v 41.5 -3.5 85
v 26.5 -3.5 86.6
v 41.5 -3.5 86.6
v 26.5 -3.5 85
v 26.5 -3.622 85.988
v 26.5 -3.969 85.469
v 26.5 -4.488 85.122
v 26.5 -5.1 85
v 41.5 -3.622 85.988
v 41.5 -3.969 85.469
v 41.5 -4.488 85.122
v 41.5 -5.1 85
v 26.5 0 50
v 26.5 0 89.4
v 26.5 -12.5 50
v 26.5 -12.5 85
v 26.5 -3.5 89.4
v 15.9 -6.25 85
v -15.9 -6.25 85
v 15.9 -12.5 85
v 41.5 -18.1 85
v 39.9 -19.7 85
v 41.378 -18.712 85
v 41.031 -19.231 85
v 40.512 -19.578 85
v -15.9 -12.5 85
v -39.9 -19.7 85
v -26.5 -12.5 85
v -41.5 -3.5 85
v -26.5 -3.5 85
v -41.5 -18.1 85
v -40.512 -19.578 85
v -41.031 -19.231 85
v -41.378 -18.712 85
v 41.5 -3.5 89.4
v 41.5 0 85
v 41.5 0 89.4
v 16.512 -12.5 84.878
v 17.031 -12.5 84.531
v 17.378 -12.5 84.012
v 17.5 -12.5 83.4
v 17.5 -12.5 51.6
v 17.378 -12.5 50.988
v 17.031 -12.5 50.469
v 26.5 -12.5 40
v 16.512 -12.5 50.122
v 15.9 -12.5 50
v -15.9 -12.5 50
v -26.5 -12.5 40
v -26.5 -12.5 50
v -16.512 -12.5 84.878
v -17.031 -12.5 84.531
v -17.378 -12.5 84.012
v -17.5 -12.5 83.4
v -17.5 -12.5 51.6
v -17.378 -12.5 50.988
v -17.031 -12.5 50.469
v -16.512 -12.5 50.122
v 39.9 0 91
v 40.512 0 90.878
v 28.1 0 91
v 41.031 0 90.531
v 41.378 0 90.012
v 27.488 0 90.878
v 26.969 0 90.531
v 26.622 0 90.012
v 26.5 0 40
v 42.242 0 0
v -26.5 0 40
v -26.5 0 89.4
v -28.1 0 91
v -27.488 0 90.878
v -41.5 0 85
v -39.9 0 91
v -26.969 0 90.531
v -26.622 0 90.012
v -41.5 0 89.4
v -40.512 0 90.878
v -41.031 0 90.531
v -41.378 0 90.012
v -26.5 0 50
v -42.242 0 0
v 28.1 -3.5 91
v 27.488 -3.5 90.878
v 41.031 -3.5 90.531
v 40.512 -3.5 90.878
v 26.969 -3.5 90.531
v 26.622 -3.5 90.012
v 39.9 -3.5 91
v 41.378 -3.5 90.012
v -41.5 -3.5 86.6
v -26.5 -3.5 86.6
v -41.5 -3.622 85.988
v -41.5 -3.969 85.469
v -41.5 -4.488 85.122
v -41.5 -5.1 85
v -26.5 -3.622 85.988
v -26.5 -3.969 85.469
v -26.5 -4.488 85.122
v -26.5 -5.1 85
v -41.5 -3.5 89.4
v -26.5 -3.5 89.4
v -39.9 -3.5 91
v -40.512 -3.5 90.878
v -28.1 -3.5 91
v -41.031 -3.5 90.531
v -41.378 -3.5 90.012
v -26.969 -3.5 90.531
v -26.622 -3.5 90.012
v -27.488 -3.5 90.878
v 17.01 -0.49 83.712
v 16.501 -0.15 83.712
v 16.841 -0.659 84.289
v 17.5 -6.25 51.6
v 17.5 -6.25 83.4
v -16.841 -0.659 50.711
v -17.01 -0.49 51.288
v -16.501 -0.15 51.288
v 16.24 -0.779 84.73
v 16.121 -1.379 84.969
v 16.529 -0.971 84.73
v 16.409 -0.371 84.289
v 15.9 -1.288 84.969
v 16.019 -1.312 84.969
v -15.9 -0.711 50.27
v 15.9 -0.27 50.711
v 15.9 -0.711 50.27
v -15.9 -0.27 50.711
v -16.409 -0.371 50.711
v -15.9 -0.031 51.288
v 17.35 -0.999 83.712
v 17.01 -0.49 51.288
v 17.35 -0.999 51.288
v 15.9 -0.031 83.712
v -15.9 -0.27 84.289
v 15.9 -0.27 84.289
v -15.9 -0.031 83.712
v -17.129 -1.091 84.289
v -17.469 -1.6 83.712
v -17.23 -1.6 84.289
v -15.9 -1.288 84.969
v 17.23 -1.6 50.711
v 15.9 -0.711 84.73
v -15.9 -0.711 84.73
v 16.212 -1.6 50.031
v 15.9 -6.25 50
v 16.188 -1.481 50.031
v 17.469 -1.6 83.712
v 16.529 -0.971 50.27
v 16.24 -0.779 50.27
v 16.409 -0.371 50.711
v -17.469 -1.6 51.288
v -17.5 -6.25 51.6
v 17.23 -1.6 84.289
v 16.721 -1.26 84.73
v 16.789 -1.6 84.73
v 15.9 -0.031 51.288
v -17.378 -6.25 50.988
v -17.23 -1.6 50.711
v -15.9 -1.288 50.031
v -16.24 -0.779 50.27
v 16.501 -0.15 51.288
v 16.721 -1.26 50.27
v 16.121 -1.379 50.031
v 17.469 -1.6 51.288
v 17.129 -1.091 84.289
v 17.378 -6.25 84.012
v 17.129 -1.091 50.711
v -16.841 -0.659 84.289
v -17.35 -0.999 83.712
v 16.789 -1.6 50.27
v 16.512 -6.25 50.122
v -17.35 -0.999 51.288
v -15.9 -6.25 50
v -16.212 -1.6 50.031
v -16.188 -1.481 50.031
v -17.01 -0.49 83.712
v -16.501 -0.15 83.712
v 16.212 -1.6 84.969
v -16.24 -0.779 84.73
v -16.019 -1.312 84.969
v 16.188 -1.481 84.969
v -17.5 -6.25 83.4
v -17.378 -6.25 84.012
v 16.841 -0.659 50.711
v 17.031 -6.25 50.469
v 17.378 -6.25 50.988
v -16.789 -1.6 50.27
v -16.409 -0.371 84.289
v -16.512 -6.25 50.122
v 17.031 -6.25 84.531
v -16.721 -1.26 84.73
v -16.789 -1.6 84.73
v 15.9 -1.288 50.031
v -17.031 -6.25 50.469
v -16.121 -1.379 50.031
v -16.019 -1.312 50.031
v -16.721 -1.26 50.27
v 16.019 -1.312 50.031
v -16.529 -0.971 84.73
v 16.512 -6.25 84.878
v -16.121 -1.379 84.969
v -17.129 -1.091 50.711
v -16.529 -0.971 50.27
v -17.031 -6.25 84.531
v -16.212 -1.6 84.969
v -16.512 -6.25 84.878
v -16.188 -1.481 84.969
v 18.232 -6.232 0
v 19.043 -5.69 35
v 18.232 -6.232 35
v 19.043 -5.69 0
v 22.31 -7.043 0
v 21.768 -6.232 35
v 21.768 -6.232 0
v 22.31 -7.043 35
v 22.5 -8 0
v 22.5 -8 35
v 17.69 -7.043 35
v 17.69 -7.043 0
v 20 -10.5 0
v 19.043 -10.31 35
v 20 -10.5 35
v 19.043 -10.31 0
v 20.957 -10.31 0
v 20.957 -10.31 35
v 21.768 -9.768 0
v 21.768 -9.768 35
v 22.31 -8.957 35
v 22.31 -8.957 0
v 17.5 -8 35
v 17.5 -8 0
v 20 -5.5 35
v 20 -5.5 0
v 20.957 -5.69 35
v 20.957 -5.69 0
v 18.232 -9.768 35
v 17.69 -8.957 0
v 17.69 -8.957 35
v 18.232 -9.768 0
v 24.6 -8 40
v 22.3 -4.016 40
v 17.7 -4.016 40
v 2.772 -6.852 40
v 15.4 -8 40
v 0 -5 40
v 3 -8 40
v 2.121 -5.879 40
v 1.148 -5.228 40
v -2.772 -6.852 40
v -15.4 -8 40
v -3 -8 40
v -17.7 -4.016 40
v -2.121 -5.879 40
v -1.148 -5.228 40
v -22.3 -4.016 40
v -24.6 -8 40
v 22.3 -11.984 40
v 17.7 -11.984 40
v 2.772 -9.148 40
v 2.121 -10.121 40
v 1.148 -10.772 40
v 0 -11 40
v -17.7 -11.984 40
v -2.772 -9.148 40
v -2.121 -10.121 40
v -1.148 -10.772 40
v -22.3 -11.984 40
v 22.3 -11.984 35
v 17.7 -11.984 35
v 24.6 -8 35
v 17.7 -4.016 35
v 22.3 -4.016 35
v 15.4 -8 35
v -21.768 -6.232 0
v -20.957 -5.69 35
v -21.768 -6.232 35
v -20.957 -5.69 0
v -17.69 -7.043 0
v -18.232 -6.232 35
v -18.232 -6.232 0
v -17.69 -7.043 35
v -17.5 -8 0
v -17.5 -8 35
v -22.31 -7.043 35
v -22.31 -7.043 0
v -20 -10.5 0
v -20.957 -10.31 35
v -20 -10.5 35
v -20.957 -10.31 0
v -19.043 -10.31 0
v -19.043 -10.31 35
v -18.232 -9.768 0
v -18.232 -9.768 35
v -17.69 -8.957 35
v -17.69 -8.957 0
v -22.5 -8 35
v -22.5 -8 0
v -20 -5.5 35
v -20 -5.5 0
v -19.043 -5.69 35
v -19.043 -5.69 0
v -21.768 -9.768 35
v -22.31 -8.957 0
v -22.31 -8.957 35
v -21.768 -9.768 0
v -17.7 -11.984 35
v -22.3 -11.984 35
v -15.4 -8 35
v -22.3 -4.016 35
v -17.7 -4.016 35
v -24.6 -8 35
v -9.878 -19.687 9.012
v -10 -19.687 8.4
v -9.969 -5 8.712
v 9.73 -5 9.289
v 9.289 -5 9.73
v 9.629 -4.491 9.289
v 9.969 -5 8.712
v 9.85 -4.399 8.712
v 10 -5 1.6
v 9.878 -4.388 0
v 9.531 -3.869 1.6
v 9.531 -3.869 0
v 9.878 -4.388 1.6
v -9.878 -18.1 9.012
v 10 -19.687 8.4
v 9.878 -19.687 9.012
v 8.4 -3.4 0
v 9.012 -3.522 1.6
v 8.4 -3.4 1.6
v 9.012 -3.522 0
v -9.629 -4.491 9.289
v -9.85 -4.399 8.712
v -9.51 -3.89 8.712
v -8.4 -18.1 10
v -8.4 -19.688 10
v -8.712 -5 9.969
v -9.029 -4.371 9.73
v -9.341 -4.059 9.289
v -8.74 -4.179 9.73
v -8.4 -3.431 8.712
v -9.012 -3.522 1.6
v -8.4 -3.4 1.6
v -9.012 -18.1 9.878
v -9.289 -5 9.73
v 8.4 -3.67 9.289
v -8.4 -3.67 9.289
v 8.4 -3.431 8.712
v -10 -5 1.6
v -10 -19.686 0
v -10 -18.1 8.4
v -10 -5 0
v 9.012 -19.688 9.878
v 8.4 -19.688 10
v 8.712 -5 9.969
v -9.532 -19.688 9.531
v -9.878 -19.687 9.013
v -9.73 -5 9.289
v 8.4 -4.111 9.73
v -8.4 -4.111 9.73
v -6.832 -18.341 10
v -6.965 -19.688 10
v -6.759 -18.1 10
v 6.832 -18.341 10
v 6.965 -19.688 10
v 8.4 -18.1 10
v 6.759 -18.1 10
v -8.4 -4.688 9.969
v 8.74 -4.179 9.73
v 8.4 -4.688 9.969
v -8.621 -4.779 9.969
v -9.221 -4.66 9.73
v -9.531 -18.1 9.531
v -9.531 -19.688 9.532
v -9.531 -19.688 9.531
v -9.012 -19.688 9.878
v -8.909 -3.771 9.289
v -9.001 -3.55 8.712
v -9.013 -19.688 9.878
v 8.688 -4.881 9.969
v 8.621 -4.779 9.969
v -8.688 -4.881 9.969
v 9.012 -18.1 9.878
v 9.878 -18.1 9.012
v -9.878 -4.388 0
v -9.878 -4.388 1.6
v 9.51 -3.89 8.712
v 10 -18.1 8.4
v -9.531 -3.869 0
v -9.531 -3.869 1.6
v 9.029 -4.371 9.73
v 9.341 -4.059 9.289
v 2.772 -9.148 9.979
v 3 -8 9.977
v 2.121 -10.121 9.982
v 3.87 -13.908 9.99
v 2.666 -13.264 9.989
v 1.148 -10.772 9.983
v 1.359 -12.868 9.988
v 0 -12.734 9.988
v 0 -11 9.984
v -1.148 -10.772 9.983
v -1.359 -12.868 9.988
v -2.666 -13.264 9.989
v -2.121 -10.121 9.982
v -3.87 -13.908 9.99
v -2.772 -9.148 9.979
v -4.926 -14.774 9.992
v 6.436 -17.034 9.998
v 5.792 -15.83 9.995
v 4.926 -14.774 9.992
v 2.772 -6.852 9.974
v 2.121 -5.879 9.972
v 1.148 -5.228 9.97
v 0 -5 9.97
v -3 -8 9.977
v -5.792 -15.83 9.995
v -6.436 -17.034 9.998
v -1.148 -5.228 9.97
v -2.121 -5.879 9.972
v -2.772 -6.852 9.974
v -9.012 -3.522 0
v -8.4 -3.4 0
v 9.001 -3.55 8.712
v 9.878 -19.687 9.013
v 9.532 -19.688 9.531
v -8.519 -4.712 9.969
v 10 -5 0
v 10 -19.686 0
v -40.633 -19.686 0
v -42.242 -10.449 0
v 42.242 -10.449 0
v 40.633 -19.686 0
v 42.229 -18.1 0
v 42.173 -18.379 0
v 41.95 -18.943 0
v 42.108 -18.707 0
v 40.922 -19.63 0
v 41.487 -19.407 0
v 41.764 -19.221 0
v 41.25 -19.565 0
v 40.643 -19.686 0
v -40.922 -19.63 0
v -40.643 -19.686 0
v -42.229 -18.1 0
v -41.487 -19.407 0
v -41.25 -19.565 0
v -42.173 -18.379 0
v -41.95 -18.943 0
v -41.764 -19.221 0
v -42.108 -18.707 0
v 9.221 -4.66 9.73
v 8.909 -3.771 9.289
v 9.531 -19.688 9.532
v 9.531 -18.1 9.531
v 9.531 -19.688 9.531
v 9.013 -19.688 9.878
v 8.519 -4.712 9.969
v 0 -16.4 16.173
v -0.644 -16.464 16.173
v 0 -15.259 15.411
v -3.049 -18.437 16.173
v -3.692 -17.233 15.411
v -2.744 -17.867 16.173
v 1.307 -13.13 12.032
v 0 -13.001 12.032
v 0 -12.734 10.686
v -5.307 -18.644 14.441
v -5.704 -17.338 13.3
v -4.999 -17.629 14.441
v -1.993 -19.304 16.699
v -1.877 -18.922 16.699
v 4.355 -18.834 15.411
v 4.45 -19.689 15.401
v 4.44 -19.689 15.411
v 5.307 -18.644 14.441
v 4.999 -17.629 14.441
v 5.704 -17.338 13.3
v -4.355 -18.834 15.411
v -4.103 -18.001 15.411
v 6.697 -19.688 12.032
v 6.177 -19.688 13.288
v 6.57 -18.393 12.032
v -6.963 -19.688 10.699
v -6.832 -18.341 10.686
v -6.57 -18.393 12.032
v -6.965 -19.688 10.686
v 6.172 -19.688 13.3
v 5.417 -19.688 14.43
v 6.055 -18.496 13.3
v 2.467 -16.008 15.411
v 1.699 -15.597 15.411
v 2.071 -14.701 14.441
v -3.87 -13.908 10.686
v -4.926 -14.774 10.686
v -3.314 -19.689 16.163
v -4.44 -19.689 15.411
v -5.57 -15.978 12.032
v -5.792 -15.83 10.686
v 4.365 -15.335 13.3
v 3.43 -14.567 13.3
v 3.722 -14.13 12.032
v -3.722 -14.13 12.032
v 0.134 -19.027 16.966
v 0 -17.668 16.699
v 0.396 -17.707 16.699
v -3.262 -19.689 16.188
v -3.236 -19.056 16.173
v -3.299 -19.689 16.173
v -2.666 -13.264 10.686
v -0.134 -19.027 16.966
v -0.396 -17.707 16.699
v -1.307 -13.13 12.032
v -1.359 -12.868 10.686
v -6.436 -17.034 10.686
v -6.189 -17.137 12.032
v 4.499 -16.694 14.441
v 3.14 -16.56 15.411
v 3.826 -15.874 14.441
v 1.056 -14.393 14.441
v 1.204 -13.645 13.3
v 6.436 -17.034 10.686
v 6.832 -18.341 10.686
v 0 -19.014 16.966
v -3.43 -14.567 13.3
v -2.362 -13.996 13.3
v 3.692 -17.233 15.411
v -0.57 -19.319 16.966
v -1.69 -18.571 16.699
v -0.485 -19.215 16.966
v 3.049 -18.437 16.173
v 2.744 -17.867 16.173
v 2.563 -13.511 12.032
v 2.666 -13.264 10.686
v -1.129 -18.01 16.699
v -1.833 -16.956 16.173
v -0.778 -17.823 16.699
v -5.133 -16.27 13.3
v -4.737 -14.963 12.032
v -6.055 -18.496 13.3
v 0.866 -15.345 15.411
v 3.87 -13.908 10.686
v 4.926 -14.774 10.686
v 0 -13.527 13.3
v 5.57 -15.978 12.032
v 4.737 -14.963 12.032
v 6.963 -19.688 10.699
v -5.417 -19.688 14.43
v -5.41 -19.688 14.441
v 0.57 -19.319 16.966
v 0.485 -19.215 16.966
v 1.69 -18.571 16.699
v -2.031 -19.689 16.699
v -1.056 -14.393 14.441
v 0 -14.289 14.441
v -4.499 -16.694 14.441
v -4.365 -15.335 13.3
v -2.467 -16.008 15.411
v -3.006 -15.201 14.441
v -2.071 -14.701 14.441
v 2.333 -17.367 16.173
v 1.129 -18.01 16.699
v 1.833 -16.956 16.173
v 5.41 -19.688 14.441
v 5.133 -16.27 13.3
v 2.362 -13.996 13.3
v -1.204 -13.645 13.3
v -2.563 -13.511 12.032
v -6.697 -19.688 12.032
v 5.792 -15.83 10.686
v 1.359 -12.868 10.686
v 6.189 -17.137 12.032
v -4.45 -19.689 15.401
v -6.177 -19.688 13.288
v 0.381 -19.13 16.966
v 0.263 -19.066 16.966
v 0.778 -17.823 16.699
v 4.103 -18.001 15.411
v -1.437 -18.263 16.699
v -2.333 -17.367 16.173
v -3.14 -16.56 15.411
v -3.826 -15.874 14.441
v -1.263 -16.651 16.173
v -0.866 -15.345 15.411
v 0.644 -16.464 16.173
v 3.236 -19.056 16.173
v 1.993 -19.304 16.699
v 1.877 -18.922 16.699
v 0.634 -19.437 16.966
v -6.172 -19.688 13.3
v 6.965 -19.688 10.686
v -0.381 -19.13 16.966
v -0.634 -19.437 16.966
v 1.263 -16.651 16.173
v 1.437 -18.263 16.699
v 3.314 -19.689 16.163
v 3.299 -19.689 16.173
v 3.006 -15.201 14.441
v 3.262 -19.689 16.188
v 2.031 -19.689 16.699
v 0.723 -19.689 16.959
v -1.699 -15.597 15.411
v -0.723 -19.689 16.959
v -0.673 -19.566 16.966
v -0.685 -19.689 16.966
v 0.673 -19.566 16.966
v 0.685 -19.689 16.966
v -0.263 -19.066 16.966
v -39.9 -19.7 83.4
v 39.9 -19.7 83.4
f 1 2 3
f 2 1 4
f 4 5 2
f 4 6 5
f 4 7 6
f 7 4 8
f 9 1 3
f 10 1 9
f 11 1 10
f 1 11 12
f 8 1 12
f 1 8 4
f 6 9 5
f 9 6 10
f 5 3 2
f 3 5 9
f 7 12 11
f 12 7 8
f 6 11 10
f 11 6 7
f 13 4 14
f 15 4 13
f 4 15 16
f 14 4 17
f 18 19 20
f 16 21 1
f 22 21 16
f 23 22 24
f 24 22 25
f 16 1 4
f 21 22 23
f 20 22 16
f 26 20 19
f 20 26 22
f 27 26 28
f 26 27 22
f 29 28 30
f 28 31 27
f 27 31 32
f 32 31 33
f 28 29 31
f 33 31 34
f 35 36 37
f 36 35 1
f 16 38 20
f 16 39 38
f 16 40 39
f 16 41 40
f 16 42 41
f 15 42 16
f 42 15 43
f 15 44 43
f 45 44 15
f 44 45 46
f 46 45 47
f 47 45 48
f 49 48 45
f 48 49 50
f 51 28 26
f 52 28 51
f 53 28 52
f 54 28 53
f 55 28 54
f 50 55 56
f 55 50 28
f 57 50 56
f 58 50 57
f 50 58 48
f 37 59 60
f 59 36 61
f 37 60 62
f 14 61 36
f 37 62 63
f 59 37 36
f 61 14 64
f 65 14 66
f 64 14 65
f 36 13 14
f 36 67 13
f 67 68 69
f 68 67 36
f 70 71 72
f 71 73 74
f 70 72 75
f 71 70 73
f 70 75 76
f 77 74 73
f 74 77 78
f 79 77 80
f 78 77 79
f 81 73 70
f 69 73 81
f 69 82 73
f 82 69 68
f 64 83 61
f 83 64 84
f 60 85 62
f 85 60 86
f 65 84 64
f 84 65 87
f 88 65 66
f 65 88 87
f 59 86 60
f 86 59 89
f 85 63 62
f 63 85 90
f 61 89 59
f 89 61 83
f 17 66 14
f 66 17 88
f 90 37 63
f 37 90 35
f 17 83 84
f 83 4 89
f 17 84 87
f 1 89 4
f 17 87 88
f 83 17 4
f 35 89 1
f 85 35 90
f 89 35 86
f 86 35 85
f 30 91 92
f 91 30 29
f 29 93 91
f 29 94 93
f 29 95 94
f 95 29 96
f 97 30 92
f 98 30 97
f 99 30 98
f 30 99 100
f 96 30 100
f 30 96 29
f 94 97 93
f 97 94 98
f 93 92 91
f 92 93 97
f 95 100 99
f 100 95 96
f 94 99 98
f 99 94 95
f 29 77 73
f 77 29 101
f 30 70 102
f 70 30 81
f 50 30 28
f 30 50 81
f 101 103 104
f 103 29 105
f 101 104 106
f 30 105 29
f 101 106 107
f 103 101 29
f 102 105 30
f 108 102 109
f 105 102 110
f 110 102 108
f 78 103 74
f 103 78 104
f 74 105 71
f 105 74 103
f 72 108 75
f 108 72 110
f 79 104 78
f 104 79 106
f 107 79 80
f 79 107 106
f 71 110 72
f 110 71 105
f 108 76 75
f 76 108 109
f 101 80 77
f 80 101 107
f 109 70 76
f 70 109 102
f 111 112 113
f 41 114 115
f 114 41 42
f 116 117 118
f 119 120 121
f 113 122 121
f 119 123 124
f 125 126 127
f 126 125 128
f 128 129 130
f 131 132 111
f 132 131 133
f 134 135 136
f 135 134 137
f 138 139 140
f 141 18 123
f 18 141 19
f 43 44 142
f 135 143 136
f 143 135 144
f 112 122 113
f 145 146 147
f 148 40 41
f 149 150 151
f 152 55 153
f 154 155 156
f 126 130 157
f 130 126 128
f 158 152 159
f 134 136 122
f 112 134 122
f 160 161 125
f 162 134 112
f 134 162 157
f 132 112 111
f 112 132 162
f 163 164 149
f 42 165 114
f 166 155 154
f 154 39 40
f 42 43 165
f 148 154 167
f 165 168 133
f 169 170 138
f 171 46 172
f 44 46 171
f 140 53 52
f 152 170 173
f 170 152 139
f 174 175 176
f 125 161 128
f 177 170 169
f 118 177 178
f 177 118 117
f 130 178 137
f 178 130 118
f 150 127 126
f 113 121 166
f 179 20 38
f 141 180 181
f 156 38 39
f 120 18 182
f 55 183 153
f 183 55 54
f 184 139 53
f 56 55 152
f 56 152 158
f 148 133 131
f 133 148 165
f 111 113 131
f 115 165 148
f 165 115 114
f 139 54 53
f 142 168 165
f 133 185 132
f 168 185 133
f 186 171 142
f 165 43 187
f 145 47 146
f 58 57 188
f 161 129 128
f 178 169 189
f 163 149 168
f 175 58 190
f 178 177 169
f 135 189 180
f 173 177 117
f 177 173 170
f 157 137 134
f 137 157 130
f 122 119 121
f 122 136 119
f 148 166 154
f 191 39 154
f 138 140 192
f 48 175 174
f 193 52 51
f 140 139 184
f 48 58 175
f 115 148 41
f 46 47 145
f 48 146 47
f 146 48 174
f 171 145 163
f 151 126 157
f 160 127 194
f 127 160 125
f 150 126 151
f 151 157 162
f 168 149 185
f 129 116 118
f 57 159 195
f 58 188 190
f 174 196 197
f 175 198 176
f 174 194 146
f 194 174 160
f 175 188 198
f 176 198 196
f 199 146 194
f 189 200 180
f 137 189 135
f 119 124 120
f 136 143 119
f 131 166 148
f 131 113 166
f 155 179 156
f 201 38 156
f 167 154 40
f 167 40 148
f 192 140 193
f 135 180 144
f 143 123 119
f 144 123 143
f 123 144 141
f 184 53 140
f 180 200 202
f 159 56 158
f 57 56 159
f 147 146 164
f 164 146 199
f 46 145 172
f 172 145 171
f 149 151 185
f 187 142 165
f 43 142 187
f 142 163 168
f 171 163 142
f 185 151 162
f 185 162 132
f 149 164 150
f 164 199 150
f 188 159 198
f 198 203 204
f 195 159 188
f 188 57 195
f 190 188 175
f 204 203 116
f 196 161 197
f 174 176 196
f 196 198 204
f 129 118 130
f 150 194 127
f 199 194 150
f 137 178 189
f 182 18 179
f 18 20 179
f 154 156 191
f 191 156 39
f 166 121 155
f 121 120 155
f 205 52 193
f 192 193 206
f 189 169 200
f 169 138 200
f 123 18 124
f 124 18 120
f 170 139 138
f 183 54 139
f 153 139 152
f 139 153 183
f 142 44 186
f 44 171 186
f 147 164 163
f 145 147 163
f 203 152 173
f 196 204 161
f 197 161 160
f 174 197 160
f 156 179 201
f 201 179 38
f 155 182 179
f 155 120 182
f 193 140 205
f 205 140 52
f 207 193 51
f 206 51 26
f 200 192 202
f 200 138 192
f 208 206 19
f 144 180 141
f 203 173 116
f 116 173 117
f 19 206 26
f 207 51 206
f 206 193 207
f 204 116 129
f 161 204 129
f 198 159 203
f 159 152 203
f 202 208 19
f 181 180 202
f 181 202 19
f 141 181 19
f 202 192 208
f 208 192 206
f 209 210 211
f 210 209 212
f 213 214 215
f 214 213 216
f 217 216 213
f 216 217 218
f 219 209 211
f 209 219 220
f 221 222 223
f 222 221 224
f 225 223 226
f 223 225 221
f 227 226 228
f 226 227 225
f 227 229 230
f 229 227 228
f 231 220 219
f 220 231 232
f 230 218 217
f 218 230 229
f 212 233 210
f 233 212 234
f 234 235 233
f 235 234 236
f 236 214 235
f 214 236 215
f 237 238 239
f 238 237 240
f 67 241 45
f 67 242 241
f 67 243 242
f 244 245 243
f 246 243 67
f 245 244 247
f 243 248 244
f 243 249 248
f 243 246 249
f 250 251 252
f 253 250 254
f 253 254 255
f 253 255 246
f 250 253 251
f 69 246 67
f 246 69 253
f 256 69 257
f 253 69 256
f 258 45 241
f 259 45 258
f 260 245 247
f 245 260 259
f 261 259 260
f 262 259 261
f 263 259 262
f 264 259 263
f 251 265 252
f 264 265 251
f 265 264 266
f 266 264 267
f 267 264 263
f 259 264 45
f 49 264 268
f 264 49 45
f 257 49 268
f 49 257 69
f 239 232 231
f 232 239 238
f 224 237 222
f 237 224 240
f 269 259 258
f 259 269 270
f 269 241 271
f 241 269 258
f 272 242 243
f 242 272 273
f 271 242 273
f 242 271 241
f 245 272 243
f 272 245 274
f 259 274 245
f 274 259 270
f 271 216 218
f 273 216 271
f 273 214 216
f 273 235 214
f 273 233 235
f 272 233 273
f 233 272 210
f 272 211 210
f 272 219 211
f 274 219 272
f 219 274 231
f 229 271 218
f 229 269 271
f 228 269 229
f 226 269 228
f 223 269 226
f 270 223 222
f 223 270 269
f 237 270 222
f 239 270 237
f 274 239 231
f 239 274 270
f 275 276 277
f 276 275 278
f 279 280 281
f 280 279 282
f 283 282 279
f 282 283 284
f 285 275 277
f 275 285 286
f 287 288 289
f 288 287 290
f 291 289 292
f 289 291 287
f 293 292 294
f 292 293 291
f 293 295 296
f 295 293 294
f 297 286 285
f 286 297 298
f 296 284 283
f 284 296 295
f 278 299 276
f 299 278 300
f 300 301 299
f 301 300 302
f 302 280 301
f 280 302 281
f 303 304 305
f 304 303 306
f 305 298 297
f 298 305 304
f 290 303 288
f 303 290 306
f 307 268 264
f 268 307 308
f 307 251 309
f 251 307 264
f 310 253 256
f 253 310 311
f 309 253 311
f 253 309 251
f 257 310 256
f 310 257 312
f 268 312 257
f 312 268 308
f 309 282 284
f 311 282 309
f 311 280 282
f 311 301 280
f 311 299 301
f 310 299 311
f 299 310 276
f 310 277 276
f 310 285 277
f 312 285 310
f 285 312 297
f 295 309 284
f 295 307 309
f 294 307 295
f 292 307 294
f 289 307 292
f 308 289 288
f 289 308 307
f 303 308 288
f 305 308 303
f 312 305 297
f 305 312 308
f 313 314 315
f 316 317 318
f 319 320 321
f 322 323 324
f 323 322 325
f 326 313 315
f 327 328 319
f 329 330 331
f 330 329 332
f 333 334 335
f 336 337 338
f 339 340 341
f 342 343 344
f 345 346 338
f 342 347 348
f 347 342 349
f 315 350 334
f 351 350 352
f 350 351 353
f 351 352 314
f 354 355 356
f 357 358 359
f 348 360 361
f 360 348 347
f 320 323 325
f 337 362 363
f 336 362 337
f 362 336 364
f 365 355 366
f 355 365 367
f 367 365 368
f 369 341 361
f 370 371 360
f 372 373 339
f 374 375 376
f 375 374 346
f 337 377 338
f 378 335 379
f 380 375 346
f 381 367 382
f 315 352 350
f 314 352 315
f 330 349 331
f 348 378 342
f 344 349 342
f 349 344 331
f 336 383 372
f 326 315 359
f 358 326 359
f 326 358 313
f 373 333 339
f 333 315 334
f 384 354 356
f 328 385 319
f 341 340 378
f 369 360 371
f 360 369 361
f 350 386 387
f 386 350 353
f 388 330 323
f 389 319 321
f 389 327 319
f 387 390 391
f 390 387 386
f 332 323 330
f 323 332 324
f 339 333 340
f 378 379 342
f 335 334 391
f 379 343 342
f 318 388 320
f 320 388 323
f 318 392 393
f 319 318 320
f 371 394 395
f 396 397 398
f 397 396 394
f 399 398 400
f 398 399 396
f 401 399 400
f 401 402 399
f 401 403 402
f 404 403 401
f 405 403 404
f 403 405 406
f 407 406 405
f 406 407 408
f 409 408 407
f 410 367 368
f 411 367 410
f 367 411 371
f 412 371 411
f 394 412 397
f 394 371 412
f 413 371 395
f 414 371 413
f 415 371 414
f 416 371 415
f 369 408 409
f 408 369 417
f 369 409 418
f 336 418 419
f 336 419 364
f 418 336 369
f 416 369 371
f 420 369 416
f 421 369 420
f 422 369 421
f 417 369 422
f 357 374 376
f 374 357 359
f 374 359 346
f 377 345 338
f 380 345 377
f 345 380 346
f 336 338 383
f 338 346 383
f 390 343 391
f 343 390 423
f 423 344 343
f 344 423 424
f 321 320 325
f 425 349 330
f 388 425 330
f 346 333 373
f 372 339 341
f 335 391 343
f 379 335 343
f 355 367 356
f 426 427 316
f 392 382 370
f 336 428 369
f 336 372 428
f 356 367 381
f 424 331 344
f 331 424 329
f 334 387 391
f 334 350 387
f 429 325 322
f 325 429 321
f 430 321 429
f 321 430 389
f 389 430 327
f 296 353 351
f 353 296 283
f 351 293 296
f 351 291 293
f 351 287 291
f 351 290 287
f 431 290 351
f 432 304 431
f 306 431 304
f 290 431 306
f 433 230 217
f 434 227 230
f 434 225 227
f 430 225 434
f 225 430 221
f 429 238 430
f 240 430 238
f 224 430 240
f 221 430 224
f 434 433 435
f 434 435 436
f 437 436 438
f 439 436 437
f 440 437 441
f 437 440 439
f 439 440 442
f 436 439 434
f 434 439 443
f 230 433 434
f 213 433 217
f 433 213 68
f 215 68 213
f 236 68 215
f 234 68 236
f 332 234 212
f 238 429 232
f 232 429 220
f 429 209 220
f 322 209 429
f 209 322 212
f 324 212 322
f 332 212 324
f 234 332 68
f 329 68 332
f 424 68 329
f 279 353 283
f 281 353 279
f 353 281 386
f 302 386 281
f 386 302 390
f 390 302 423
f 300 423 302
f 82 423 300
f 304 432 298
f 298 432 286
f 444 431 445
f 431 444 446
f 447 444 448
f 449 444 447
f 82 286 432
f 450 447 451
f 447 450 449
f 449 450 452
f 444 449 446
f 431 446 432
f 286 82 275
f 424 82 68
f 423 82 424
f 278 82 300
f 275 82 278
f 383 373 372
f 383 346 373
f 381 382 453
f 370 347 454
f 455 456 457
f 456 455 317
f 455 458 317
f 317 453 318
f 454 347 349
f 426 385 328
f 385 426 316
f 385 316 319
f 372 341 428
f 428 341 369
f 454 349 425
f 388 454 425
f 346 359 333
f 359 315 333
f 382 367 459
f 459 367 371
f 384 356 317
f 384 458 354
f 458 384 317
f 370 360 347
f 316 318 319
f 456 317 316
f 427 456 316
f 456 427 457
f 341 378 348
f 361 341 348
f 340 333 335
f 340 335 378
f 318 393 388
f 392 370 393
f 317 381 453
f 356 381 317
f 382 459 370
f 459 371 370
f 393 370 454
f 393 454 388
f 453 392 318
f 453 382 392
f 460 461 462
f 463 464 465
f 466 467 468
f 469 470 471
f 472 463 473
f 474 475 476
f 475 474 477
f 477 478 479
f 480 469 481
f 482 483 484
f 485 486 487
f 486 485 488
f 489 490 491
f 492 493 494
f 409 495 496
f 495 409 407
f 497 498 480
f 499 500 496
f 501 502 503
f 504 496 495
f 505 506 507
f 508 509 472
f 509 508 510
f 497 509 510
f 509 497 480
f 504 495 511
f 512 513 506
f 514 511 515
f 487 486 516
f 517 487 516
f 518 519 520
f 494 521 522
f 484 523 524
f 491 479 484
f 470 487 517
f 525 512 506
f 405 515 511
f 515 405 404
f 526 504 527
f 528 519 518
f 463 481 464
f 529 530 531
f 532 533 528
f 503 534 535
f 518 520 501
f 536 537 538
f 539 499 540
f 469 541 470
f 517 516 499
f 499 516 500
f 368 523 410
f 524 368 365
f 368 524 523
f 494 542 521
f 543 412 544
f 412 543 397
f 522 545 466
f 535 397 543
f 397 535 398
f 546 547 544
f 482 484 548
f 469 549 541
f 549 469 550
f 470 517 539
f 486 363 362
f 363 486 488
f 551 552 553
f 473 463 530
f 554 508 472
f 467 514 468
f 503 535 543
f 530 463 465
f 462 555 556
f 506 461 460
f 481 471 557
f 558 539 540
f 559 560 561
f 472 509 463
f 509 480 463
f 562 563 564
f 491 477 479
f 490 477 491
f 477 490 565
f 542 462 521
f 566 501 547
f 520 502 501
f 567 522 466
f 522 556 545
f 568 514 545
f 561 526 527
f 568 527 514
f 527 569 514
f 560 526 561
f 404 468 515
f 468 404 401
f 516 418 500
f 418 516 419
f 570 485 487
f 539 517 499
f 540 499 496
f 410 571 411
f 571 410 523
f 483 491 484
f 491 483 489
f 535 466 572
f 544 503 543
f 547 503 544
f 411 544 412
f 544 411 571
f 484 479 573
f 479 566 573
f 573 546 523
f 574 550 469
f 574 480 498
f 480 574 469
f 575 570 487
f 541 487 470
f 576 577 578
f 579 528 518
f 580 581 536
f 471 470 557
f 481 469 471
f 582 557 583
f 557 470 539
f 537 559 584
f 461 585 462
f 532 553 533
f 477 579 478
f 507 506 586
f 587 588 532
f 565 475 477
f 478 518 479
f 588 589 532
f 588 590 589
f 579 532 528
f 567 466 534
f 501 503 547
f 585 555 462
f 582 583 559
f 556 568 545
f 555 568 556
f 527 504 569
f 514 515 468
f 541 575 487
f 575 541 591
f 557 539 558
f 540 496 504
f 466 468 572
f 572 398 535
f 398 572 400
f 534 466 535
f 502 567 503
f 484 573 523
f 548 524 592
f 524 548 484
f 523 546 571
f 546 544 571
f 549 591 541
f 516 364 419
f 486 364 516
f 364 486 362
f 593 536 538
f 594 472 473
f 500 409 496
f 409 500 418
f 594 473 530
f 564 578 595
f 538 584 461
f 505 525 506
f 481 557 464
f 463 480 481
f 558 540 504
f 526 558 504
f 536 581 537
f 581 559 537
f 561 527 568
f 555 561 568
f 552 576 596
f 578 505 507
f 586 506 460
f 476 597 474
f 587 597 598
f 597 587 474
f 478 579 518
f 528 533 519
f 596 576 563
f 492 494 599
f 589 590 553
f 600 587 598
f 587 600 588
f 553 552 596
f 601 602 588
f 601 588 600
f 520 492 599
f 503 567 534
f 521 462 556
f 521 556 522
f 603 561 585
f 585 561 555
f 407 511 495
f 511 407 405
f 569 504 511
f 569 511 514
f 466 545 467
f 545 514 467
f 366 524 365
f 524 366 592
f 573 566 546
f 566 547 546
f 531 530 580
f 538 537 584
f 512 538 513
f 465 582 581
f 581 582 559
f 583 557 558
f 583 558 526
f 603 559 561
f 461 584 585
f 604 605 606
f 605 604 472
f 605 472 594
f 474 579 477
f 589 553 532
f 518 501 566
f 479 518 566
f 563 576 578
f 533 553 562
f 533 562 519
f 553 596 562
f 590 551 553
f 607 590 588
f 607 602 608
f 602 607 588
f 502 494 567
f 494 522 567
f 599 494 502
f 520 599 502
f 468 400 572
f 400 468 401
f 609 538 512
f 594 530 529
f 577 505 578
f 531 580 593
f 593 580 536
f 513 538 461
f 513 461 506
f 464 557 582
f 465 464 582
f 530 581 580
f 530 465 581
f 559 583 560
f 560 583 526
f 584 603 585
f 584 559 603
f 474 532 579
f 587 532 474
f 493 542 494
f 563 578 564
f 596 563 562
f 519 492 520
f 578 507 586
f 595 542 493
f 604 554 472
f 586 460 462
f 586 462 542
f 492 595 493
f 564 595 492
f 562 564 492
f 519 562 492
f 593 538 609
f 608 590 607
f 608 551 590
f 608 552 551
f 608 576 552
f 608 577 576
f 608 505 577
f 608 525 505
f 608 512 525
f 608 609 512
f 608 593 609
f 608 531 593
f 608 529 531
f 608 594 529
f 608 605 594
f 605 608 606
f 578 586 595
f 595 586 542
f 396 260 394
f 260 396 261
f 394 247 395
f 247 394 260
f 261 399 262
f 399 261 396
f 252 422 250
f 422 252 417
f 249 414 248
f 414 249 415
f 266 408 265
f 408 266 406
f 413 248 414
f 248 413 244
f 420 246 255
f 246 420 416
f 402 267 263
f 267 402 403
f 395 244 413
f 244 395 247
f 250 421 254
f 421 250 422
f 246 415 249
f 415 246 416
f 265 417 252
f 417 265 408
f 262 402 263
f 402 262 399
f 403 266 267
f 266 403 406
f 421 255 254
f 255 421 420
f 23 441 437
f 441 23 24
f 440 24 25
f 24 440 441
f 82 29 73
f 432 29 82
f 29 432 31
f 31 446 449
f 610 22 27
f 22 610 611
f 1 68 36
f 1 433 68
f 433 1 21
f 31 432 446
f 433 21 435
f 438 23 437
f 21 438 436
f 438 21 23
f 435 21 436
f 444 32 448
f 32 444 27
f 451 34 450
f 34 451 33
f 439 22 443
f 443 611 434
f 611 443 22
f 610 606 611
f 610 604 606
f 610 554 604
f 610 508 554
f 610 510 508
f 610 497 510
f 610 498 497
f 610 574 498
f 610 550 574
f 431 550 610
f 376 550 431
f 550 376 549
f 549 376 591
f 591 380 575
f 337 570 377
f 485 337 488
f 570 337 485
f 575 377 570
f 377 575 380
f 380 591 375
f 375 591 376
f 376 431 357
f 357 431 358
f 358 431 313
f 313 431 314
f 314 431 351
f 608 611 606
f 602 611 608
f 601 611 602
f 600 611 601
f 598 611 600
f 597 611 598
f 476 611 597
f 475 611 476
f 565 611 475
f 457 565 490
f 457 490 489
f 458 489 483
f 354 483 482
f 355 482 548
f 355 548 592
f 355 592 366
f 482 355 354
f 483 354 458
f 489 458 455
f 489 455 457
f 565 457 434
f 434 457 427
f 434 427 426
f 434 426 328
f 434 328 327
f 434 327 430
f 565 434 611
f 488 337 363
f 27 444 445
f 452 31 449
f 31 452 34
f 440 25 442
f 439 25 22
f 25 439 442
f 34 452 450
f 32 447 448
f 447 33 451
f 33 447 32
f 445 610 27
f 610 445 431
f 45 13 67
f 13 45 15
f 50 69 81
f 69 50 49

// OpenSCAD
// file: brompton-klickfix.scad
use <MCAD/regular_shapes.scad>

//Bodge amount for overlapping parts in difference operations
b = 0.1;

//Klickfix lift
kl = 150;


//Main body dimensions
w = 83;
d = 19.7;
h = kl+35;

//Split height
spl = 100;

//Brompton socket height
bsh = 70;
	
//Stiffeners
sd = 5;

//Corner radius
r = 1.6;

module fillet (r,l) {
	rotate([0,0,180])
		translate([-r,-r,0])
			difference() {
				cube([r,r,l]);
				translate([0,0,-l/2])
					cylinder(2*l,r,r,$fn=16);
    }
}

module spool(sd,sl) {
	t = 0.1;
	cylinder(sl,sd/2,sd/2,$fn=16);
	cylinder(sd,sd*1.8/2+t,sd*1.8/2+t,$fn=16);
	translate([0,0,sl-sd])
		cylinder(sd,sd*1.8/2+t,sd*1.8/2+t,$fn=6);
}

//Cube with 8 rounded edges and 4 square edges
module semi_rounded_cube(w,d,h,r) {
    hull()
        for(i=[0,1])
            for(j=[0,1])
                translate([r+i*(w-2*r),r+j*(d-2*r),0]){
                    cylinder(r,r,r,$fn=16);
                    translate([0,0,h-r])
                        sphere(r,$fn=16);
                }
}

//Cube with 5 rounded edges and 7 square edges
module demi_rounded_cube(w,d,h,r) {
    hull()
        for(i=[0,1])
            translate([r+i*(w-2*r),0,0]){
                translate([0,r,0])
                    cylinder(r,r,r,$fn=16);
                translate([-r,d-2*r,0])
                    cube([2*r,2*r,2*r]);
                translate([0,r,h-r])
                    sphere(r,$fn=16);
                translate([0,d-r,h-r])
                    rotate([-90,0,0])
                        cylinder(r,r,r,$fn=16);
            }

}


//Extruded trapezium with rounded sides
//h=height
//w=width of base between centres of rounded sides
//a=angle of sides from vertical
//r=radius of rounded sides (thickness = 2*r)
module rd_tpz(h,w,a,r) {
    union() {
        intersection() {
			//Create two cylinders for the rounded sides
            union() {
                translate([-w/2,0,0])
                    rotate([0,a,0])
                        translate([0,0,-h/2])
                            cylinder(2*h,r,r);               
                translate([w/2,0,0])
                    rotate([0,-a,0])
                        translate([0,0,-h/2])
                            cylinder(2*h,r,r);
            }
			//Intersect with cube to get desired height
            {
                translate([0,0,h/2])
                    cube([2*w,r*4,h],true);
            }
       }

	//Fill in between cylinders with an extruded trapezium
    w_t=w-2*h*tan(a);
    translate([0,r,0])
        rotate([90,0,0])
            linear_extrude(height=2*r,convexity=10)
                polygon([[-w/2,0],[-w_t/2,h],[w_t/2,h],[w/2,0]]);
    }
}

//Round fillet for front of brompton socket
//r = radius of fillet
//a = tilt angle
//h = height of fillet
module b_fill (r,a,h) {
    intersection(){
        rotate([0,a,0]){
			//Create fillet by subtracting two cylinders from a cube
            difference(){
                translate([-r,0,-h/2])
                   cube([2*r,r,2*h]);
                translate([-r,0,-h/2])
                    cylinder(2*h,r,r);
                translate([r,0,-h/2])
                    cylinder(2*h,r-b,r-b);
            }
        }
		//Intersect with cube to get desired height
		translate([0,0,h/2])
			cube([2*h,r*4,h],true);
    }
}

//Brompton socket
module b_socket () {
	//Parameters
	r = 13.7/2;	//Radius of groove
	h = bsh;		//Height of socket
	c = 2.45;		//Clearance around mounting block
	w = 67.5+2*c-2*r;	//Width of socket between groove centres
	a = 7.4;		//Tilt angle of grooves from vertical
	t = 3;		//Thickness of socket shell
	s = 1;		//Size of step in groove
	sp = 2/3;	//Position of step relative to socket height
	ow = 34;		//Width of cut-out in back of socket
	tc = [15,t+b,20];	//Size of latch hole
	th = 27;		//Height of latch hole centre
	translate([0,-r-t,0])
		difference() {
			//External shape of socket
			rd_tpz(h,w,a,r+t);
			//Remove Lower part of inner
			translate([0,0,-b])
				rd_tpz(h*sp+b*2,w+b*sin(a),a,r);
			//Remove Upper part of inner
			translate([0,0,h*sp])
				rd_tpz(h*(1-sp)+b,w-2*h*sp*tan(a)-2*s ,a,r);
			//Remove Rear cut-out
			translate([0,-r+b/2,0])
				rotate([90,0,0])
					linear_extrude(height=t+b,convexity=10)
						polygon([[-w/2,-b],[-ow/2,(w-ow)/2],[-ow/2,h+b],[ow/2,h+b],[ow/2,(w-ow)/2],[w/2,-b]]);
			//Remove Latch hole
			translate([0,r+t/2,th])
				cube(tc,center=true);
		}

	//Add fillets at front of socket
	/*translate([-w/2-r-t,-r-t,0])
		b_fill(r+t,a,h);
	mirror([1,0,0])
		translate([-w/2-r-t,-r-t,0])
			b_fill(r+t,a,h);*/
}

module kfix_plug () {
	//Parameters
	h = 35;		//Height of plug
	d = 12.5;	//Depth of plug
	sw = 35;	//Width of square
	sr = 1.6;	//Radius of square corners
	hc = 68;	//Hook spacing
	hw = 15;	//Hook width
	hl = 6;		//Hook length
	ht = 3.5;	//Hook thickness
	
	//Square plug
	hull()
		for(i=[0,1])
			for(j=[0,1]) {
				translate([-sw/2+sr+i*(sw-2*sr),sr,sr+j*(h-2*sr)])
					sphere(sr,$fn=16);
				translate([-sw/2+sr+i*(sw-2*sr),d,sr+j*(h-2*sr)])
					rotate([90,0,0])
						cylinder(d/2,sr,sr,$fn=16);
			}
	//Hooks
	for(i=[0,1]) {
		c = -hc/2+i*hc; //Centre of this hook
		translate([c-hw/2,0,0]){
			cube([hw,d,h]);
			translate([0,0,h])
				hull(){
					translate([sr,0,hl-sr])
						rotate([-90,0,0])
							cylinder(ht,sr,sr,$fn=16);
					translate([hw-sr,0,hl-sr])
						rotate([-90,0,0])
							cylinder(ht,sr,sr,$fn=16);
					cube([hw,ht,hl/2]);}
			translate([0,ht,h])
				rotate([0,90,0])
					rotate([0,0,90])
						fillet(sr,hw);
		}
	}
	

}

module kf_tab_cutout(){
    
    //KF tab cutout
    kft_w = 20;
    kft_h = 10;
    kft_f = 7; //finger radius   
    kfh_r = 3; //radius of hook channel
	kft_hd = 5+kfh_r; //Depth of hook channel from front
    kft_d = d-kft_hd+kfh_r+r; //Overall depth of tab cutout

    translate([-kft_w/2,kft_d,0])
        mirror([0,1,0]) {
			demi_rounded_cube(kft_w,kft_d,kft_h,r);
			translate([kft_w/2,kft_d,kft_h])
				sphere(kft_f,$fn=32);
			translate([kft_w/2,kfh_r+r,kft_h-r])
				cylinder(h-spl-kft_h,kfh_r,kfh_r,$fn=16);
	}

}

module body(){

	//KF latch cutout
	kfl_w = 53;
	kfl_h = 10;
	kfl_d = 12.5;
    
	
	//fixing hole 
	hd = 5; //diameter
	hs = 40; // hole spacing
	hy = 8;//9.85; // hole distance from front
	
	difference(){
		union()
            //Outer cube of block
			hull()
			{
				translate([-w/2,-d+r,r+b])
					sphere(r,$fn=16);
				translate([w/2,-d+r,r+b])
					sphere(r,$fn=16);
				translate([-w/2,0,r+b])
					rotate([90,0,0])
						cylinder(r,r,r,$fn=16);
				translate([w/2,0,r+b])
					rotate([90,0,0])
						cylinder(r,r,r,$fn=16);
				translate([w/2-r,-r,h-r])
					cube([r,r,r]);
				translate([-w/2,-r,h-r])
					cube([r,r,r]);
				translate([-w/2+r,-d+r,h-r])
					cylinder(r,r,r,$fn=16);
				translate([w/2-r,-d+r,h-r])
					cylinder(r,r,r,$fn=16);
				}
		//Minus hull of brompton socket
        hull()
			b_socket();
        //Minus hull of klickfix plug
		hull()
			translate([0,0,kl])
				rotate([0,0,180])
					kfix_plug();
		
        //Minus gap below klickfix 
		translate([-kfl_w/2,-kfl_d,kl-kfl_h])
			cube([kfl_w,kfl_d,kfl_h+b]);
                
        //Minus 2x fastening holes
		translate([hs/2,-hy,bsh])
			spool(hd,kl-kfl_h-bsh);
		translate([-hs/2,-hy,bsh])
			spool(hd,kl-kfl_h-bsh);
            
        //Minus latch tab hole
        translate([0,-d,spl])
			kf_tab_cutout();
	}
}

module brompton_klickfix(){
		body();		
		b_socket();
		translate([0,0,kl])
			rotate([0,0,180])
				kfix_plug();
}
// main file
use <brompton-klickfix.scad>

intersection(){
	translate([0,0,-100])
		brompton_klickfix();
	translate([-500,-500,0])
		cube([1000,1000,1000]);
}
